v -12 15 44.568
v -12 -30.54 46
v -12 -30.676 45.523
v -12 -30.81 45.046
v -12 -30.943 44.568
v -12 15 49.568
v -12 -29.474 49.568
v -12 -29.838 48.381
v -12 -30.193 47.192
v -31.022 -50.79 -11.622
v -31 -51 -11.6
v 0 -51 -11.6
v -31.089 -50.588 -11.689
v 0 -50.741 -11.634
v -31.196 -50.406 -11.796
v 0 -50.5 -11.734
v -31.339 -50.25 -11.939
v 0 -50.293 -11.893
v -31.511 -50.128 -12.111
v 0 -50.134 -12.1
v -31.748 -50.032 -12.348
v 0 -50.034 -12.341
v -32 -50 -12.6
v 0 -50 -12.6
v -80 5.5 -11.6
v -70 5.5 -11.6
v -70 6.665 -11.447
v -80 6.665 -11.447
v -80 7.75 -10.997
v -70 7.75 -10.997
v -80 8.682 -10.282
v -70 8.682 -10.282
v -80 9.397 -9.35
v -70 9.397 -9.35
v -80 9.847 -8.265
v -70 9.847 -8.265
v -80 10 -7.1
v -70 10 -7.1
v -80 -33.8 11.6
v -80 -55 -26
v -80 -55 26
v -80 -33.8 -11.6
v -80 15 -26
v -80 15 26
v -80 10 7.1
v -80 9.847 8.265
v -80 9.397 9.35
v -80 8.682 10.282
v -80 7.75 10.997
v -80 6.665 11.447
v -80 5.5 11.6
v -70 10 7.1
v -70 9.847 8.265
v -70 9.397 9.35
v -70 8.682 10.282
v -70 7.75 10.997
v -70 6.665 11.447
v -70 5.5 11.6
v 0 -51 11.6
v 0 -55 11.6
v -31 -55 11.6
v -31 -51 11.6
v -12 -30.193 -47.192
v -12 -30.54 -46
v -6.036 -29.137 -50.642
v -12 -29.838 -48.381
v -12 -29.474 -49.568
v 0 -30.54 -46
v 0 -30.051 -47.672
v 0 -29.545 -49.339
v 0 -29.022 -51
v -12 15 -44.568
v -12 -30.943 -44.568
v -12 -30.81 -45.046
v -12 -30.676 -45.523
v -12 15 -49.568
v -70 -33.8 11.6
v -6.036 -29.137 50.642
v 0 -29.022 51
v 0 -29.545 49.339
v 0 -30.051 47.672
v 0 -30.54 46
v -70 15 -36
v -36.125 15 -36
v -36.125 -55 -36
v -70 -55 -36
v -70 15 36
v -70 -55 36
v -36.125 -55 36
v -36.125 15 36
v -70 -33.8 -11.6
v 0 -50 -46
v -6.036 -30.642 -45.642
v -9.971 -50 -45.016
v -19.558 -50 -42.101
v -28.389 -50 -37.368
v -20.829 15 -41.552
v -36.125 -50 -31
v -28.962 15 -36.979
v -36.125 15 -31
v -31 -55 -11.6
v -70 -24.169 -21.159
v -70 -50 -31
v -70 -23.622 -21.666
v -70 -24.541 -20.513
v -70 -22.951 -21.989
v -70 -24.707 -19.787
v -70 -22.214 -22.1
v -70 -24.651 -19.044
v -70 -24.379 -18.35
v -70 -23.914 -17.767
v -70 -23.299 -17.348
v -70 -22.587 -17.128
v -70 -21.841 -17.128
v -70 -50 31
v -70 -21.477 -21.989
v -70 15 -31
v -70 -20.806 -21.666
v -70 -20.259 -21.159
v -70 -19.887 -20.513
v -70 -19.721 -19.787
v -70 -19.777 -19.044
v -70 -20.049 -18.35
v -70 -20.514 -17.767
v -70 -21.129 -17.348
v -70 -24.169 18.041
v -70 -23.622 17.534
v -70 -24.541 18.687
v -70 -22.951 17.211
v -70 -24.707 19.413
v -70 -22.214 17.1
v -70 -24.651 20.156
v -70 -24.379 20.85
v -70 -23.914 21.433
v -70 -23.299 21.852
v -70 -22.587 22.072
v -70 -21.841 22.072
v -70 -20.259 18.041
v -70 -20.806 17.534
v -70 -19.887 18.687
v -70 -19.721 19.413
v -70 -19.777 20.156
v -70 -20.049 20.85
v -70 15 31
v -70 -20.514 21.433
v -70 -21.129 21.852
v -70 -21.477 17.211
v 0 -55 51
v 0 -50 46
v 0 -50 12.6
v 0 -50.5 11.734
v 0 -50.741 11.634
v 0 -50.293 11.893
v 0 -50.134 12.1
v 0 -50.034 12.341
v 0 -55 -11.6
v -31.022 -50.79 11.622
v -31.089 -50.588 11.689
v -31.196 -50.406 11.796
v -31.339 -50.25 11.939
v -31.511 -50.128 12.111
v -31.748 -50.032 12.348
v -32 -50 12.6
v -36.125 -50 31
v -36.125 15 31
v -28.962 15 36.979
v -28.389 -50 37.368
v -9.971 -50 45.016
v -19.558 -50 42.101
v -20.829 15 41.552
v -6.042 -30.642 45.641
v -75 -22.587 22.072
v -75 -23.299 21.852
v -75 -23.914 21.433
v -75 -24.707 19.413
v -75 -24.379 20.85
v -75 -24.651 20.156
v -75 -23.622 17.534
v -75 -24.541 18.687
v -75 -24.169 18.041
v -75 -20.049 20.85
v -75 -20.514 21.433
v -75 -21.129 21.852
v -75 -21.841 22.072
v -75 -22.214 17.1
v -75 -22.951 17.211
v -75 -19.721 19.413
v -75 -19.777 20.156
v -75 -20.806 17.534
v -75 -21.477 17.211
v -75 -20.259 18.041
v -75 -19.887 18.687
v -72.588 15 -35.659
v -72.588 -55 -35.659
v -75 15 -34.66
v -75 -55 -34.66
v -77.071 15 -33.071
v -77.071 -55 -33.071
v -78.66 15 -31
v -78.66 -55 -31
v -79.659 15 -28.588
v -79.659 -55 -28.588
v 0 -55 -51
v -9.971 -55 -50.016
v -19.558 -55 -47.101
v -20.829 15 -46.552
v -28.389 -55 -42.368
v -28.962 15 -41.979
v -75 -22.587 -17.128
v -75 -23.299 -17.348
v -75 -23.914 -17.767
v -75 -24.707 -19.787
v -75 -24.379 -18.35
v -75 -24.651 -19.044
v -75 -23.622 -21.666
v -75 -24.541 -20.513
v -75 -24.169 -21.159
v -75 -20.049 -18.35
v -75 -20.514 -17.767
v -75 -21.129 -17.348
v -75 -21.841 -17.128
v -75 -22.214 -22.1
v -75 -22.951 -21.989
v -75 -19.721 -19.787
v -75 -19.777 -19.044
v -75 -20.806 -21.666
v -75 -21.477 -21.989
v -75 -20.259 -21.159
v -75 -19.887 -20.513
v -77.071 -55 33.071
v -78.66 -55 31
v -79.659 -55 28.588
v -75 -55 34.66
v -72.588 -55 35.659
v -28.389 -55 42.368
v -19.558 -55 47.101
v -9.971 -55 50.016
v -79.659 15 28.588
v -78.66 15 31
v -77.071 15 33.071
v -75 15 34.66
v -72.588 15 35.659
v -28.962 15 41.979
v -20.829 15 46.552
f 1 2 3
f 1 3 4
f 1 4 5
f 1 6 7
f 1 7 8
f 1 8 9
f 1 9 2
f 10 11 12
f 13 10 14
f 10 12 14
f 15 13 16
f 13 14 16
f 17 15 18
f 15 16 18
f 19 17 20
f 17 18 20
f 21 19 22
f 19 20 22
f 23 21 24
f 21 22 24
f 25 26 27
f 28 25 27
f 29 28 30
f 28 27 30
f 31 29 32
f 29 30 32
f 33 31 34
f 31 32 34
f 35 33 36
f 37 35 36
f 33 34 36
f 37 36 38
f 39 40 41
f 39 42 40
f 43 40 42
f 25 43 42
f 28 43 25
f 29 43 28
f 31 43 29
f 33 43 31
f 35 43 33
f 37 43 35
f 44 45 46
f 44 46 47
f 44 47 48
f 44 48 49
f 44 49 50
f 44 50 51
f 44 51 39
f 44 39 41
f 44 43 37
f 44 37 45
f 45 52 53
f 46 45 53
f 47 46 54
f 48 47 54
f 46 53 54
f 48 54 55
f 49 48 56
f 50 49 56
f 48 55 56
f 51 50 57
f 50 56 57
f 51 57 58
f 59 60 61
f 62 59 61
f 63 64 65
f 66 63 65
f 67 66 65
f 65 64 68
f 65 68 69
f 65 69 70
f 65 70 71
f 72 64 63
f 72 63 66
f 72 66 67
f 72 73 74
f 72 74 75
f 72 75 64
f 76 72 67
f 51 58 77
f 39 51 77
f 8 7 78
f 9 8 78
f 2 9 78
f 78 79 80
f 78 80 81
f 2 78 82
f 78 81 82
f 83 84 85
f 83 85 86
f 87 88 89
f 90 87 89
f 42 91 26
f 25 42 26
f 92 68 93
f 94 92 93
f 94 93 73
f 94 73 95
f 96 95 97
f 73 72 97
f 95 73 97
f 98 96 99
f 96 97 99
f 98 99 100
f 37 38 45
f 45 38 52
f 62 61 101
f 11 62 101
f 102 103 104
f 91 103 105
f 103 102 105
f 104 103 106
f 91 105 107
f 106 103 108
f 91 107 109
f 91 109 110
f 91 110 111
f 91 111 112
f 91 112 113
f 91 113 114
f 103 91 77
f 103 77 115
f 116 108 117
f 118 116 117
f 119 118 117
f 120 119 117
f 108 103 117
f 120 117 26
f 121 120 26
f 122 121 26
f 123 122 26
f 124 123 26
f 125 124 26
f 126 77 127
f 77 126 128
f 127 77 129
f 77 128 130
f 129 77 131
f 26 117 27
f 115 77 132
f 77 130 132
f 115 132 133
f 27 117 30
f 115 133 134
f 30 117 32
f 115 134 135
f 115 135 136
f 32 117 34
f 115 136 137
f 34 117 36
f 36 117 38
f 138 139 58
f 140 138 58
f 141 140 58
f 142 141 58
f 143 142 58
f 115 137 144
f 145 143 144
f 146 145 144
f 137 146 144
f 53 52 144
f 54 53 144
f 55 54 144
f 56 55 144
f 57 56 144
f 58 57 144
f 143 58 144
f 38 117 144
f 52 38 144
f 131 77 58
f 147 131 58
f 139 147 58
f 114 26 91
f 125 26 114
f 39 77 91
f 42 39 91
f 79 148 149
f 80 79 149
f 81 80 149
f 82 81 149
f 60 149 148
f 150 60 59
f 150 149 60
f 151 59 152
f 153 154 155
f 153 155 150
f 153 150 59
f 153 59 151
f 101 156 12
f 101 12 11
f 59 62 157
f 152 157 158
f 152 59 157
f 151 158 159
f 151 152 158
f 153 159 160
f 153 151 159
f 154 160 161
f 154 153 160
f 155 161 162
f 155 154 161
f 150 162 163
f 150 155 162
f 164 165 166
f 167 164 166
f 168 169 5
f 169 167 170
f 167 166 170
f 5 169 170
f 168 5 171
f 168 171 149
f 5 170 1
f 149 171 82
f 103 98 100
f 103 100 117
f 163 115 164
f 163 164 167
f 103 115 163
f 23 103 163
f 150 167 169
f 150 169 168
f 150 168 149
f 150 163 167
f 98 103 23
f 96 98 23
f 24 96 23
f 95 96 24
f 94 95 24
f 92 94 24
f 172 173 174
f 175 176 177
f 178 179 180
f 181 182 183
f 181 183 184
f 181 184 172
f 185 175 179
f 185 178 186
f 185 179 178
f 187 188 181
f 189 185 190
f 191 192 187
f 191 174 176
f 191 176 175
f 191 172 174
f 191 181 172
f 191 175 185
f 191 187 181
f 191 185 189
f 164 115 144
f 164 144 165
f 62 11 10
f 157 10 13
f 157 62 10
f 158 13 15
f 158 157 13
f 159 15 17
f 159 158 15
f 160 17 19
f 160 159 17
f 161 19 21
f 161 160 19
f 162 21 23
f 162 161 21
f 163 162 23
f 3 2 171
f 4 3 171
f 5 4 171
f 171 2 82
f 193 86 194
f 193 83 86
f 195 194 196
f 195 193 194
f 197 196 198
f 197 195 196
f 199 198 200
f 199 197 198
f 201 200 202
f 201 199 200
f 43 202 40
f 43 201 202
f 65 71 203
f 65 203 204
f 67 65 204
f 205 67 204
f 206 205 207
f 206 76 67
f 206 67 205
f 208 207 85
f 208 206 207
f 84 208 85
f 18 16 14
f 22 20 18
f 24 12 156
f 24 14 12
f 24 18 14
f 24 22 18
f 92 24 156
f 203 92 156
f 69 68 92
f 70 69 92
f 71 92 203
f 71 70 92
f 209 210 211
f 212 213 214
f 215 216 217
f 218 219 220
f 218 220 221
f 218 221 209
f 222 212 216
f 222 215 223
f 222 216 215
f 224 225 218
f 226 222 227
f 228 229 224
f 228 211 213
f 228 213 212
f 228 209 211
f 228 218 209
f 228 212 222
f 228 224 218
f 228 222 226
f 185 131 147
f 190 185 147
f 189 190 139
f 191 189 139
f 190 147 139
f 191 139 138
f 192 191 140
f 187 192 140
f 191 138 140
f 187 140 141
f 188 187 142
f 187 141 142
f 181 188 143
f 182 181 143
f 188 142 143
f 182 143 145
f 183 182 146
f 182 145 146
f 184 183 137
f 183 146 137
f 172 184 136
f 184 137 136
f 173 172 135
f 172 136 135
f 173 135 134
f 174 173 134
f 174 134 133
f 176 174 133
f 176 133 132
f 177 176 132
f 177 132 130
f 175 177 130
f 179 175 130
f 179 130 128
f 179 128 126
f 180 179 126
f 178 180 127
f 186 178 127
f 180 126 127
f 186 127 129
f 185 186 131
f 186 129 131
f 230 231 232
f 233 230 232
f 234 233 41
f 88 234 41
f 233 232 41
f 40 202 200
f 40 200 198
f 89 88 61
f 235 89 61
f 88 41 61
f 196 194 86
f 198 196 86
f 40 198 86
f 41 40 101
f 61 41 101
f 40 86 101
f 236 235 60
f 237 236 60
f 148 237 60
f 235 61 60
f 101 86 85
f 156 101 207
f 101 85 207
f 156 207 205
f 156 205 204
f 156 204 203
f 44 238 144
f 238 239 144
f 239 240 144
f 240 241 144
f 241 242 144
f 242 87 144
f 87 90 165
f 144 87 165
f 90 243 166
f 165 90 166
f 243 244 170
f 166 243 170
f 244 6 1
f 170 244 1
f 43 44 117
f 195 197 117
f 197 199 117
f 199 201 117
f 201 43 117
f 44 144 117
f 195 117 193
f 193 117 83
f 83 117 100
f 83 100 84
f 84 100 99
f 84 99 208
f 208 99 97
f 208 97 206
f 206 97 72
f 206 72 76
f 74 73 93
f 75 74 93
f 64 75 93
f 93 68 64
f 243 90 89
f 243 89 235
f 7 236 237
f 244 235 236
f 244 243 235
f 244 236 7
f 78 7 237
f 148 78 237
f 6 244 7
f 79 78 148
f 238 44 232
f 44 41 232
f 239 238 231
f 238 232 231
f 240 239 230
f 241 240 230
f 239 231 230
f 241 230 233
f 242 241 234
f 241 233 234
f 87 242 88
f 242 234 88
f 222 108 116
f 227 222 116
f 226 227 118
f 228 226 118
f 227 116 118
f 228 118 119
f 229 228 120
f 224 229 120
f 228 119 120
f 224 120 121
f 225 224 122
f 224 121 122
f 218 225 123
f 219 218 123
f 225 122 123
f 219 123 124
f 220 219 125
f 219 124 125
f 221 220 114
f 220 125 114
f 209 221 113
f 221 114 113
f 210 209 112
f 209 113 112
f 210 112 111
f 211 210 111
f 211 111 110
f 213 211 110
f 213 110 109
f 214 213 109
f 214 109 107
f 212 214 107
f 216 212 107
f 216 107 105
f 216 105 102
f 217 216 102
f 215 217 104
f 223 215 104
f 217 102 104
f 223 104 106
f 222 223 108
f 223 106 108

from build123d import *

# Parameters (mm, degrees)
BOSS_EXTRU_5_DEPTH       = 50
ESQUISSE5_R              = 2.15
ESQUISSE5_W              = 23.2
ESQUISSE5_H              = 31.8
ENL_V_MAT_EXTRU_1_DEPTH  = 10
BOSS_EXTRU_6_DEPTH       = 5
ESQUISSE9_W              = 102
ESQUISSE9_H              = 34.999999956
ENL_V_MAT_EXTRU_2_DEPTH  = 81
ESQUISSE11_R             = 2.5
ENL_V_MAT_EXTRU_9_DEPTH  = 5
ENL_V_MAT_EXTRU_12_DEPTH = 12
CONG_1_R                 = 10
ESQUISSE12_W             = 31
ESQUISSE12_H             = 23.2
ENL_V_MAT_EXTRU_13_DEPTH = 10
CONG_2_R                 = 1


with BuildPart() as part:
    # Esquisse1 → Boss.-Extru.5 (new body, symmetric)
    with BuildSketch(Plane(origin=(0, 0, 0), x_dir=(1, 0, 0), z_dir=(0, 1, 0))):
        with BuildLine():
            ThreePointArc((-36.124783736, -31), (-19.557607216, -42.100955404), (0, -46))
            Line((0, -46), (0, -51))
            ThreePointArc((0, -51), (-19.557607216, -47.100955404), (-36.124783736, -36))
            Line((-36.124783736, -36), (-80, -36))
            Line((-80, -36), (-80, 36))
            Line((-80, 36), (-36.124783736, 36))
            ThreePointArc((-36.124783736, 36), (-19.557607216, 47.100955404), (0, 51))
            Line((0, 51), (0, 46))
            ThreePointArc((0, 46), (-19.557607216, 42.100955404), (-36.124783736, 31))
            Line((-36.124783736, 31), (-70, 31))
            Line((-70, 31), (-70, -31))
            Line((-70, -31), (-36.124783736, -31))
        make_face()
    extrude(amount=BOSS_EXTRU_5_DEPTH, both=True)

    # Esquisse5 → Enlèv. mat.-Extru.1 (cut)
    with BuildSketch(Plane(origin=(-70, 0, 0), x_dir=(0, 0, -1), z_dir=(1, 0, 0))):
        with BuildLine():
            Line((-11.59999996, -2), (11.60000004, -2))
            Line((11.60000004, -2), (11.60000004, 5.500000044))
            ThreePointArc((11.60000004, 5.500000044), (10.281980555, 8.68198056), (7.10000004, 10.000000044))
            Line((7.10000004, 10.000000044), (-7.099999871, 10.000000044))
            ThreePointArc((-7.099999871, 10.000000044), (-10.281980449, 8.681980534), (-11.59999996, 5.499999956))
            Line((-11.59999996, 5.499999956), (-11.59999996, -2))
        make_face()
        Circle(ESQUISSE5_R, mode=Mode.SUBTRACT)
        Circle(ESQUISSE5_R)
        with Locations((4e-08, -17.9)):
            Rectangle(ESQUISSE5_W, ESQUISSE5_H)
        with BuildLine():
            ThreePointArc((2.15, 0), (-1.209582286, 1.77747312), (-0.788986692, -2))
            Line((-0.788986692, -2), (0.788986692, -2))
            ThreePointArc((0.788986692, -2), (1.77747312, -1.209582286), (2.15, 0))
        make_face()
        with BuildLine():
            Line((0.788986692, -2), (-0.788986692, -2))
            ThreePointArc((-0.788986692, -2), (0, -2.15), (0.788986692, -2))
        make_face()
    extrude(amount=-ENL_V_MAT_EXTRU_1_DEPTH, mode=Mode.SUBTRACT)

    # Esquisse8 → Boss.-Extru.6 (add)
    with BuildSketch(Plane(origin=(0, -50, 0), x_dir=(1, 0, 0), z_dir=(0, 1, 0))):
        with BuildLine():
            Line((0, -51), (0, 51))
            ThreePointArc((0, 51), (-19.557607216, 47.100955404), (-36.124783736, 36))
            Line((-36.124783736, 36), (-80, 36))
            Line((-80, 36), (-80, -36))
            Line((-80, -36), (-36.124783736, -36))
            ThreePointArc((-36.124783736, -36), (-19.557607216, -47.100955404), (0, -51))
        make_face()
    extrude(amount=-BOSS_EXTRU_6_DEPTH)

    # Esquisse9 → Enlèv. mat.-Extru.2 (cut, through all)
    with BuildSketch(Plane(origin=(0, 0, 0), x_dir=(0, 0, -1), z_dir=(1, 0, 0))):
        with Locations((0, 32.500000022)):
            Rectangle(ESQUISSE9_W, ESQUISSE9_H)
    extrude(amount=-ENL_V_MAT_EXTRU_2_DEPTH, mode=Mode.SUBTRACT)

    # Esquisse11 → Enlèv. mat.-Extru.9 (cut)
    with BuildSketch(Plane(origin=(-70, 0, 0), x_dir=(0, 0, -1), z_dir=(1, 0, 0))):
        with Locations((-19.59999996, -22.213953621)):
            Circle(ESQUISSE11_R)
        with Locations((19.59999996, -22.213953621)):
            Circle(ESQUISSE11_R)
    extrude(amount=-ENL_V_MAT_EXTRU_9_DEPTH, mode=Mode.SUBTRACT)

    # Esquisse10 → Enlèv. mat.-Extru.12 (cut)
    with BuildSketch(Plane(origin=(0, 0, 0), x_dir=(0, 0, -1), z_dir=(1, 0, 0))):
        with BuildLine():
            Line((136.28713183, 33.486696785), (85.263165158, 65.69401727))
            ThreePointArc((85.263165158, 65.69401727), (69.088826466, 48.564130721), (49.552191154, 35.397425514))
            ThreePointArc((49.552191154, 35.397425514), (-14.729470129, 24.226140009), (-73.513371624, 52.534840476))
            ThreePointArc((-73.513371624, 52.534840476), (-79.660455319, 58.871393898), (-85.263165158, 65.69401727))
            Line((-85.263165158, 65.69401727), (-136.28713183, 33.486696785))
            ThreePointArc((-136.28713183, 33.486696785), (-98.721588704, -4.696131807), (-51, -29.022011055))
            Line((-51, -29.022011055), (-51, 15.000000044))
            Line((-51, 15.000000044), (-46, 15.000000044))
            Line((-46, 15.000000044), (-46, -30.539714713))
            ThreePointArc((-46, -30.539714713), (0, -37), (46, -30.539714713))
            Line((46, -30.539714713), (46, 15.000000044))
            Line((46, 15.000000044), (51, 15.000000044))
            Line((51, 15.000000044), (51, -29.022011055))
            ThreePointArc((51, -29.022011055), (98.721588704, -4.696131807), (136.28713183, 33.486696785))
        make_face()
        with BuildLine():
            ThreePointArc((-51, -29.022011055), (-48.505936298, -29.800419724), (-46, -30.539714713))
            Line((-46, -30.539714713), (-46, 15.000000044))
            Line((-46, 15.000000044), (-51, 15.000000044))
            Line((-51, 15.000000044), (-51, -29.022011055))
        make_face()
        with BuildLine():
            ThreePointArc((46, -30.539714713), (48.505936298, -29.800419724), (51, -29.022011055))
            Line((51, -29.022011055), (51, 15.000000044))
            Line((51, 15.000000044), (46, 15.000000044))
            Line((46, 15.000000044), (46, -30.539714713))
        make_face()
    extrude(amount=-ENL_V_MAT_EXTRU_12_DEPTH, mode=Mode.SUBTRACT)

    # Congé1
    cong_1_edges = [part.edges().sort_by_distance(p)[0] for p in [
        (-80, -19.999999978, 36),
        (-80, -19.999999978, -36),
    ]]
    fillet(cong_1_edges, radius=CONG_1_R)

    # Esquisse12 → Enlèv. mat.-Extru.13 (cut)
    with BuildSketch(Plane(origin=(0, -55, 0), x_dir=(-1, 0, 0), z_dir=(0, -1, 0))):
        with Locations((15.5, 0)):
            Rectangle(ESQUISSE12_W, ESQUISSE12_H)
    extrude(amount=-ENL_V_MAT_EXTRU_13_DEPTH, mode=Mode.SUBTRACT)

    # Congé2
    cong_2_edges = [part.edges().sort_by_distance(p)[0] for p in [
        (-15.5, -50, -11.6),
        (-31, -50, 0),
        (-15.5, -50, 11.6),
    ]]
    fillet(cong_2_edges, radius=CONG_2_R)


solid = part.part
